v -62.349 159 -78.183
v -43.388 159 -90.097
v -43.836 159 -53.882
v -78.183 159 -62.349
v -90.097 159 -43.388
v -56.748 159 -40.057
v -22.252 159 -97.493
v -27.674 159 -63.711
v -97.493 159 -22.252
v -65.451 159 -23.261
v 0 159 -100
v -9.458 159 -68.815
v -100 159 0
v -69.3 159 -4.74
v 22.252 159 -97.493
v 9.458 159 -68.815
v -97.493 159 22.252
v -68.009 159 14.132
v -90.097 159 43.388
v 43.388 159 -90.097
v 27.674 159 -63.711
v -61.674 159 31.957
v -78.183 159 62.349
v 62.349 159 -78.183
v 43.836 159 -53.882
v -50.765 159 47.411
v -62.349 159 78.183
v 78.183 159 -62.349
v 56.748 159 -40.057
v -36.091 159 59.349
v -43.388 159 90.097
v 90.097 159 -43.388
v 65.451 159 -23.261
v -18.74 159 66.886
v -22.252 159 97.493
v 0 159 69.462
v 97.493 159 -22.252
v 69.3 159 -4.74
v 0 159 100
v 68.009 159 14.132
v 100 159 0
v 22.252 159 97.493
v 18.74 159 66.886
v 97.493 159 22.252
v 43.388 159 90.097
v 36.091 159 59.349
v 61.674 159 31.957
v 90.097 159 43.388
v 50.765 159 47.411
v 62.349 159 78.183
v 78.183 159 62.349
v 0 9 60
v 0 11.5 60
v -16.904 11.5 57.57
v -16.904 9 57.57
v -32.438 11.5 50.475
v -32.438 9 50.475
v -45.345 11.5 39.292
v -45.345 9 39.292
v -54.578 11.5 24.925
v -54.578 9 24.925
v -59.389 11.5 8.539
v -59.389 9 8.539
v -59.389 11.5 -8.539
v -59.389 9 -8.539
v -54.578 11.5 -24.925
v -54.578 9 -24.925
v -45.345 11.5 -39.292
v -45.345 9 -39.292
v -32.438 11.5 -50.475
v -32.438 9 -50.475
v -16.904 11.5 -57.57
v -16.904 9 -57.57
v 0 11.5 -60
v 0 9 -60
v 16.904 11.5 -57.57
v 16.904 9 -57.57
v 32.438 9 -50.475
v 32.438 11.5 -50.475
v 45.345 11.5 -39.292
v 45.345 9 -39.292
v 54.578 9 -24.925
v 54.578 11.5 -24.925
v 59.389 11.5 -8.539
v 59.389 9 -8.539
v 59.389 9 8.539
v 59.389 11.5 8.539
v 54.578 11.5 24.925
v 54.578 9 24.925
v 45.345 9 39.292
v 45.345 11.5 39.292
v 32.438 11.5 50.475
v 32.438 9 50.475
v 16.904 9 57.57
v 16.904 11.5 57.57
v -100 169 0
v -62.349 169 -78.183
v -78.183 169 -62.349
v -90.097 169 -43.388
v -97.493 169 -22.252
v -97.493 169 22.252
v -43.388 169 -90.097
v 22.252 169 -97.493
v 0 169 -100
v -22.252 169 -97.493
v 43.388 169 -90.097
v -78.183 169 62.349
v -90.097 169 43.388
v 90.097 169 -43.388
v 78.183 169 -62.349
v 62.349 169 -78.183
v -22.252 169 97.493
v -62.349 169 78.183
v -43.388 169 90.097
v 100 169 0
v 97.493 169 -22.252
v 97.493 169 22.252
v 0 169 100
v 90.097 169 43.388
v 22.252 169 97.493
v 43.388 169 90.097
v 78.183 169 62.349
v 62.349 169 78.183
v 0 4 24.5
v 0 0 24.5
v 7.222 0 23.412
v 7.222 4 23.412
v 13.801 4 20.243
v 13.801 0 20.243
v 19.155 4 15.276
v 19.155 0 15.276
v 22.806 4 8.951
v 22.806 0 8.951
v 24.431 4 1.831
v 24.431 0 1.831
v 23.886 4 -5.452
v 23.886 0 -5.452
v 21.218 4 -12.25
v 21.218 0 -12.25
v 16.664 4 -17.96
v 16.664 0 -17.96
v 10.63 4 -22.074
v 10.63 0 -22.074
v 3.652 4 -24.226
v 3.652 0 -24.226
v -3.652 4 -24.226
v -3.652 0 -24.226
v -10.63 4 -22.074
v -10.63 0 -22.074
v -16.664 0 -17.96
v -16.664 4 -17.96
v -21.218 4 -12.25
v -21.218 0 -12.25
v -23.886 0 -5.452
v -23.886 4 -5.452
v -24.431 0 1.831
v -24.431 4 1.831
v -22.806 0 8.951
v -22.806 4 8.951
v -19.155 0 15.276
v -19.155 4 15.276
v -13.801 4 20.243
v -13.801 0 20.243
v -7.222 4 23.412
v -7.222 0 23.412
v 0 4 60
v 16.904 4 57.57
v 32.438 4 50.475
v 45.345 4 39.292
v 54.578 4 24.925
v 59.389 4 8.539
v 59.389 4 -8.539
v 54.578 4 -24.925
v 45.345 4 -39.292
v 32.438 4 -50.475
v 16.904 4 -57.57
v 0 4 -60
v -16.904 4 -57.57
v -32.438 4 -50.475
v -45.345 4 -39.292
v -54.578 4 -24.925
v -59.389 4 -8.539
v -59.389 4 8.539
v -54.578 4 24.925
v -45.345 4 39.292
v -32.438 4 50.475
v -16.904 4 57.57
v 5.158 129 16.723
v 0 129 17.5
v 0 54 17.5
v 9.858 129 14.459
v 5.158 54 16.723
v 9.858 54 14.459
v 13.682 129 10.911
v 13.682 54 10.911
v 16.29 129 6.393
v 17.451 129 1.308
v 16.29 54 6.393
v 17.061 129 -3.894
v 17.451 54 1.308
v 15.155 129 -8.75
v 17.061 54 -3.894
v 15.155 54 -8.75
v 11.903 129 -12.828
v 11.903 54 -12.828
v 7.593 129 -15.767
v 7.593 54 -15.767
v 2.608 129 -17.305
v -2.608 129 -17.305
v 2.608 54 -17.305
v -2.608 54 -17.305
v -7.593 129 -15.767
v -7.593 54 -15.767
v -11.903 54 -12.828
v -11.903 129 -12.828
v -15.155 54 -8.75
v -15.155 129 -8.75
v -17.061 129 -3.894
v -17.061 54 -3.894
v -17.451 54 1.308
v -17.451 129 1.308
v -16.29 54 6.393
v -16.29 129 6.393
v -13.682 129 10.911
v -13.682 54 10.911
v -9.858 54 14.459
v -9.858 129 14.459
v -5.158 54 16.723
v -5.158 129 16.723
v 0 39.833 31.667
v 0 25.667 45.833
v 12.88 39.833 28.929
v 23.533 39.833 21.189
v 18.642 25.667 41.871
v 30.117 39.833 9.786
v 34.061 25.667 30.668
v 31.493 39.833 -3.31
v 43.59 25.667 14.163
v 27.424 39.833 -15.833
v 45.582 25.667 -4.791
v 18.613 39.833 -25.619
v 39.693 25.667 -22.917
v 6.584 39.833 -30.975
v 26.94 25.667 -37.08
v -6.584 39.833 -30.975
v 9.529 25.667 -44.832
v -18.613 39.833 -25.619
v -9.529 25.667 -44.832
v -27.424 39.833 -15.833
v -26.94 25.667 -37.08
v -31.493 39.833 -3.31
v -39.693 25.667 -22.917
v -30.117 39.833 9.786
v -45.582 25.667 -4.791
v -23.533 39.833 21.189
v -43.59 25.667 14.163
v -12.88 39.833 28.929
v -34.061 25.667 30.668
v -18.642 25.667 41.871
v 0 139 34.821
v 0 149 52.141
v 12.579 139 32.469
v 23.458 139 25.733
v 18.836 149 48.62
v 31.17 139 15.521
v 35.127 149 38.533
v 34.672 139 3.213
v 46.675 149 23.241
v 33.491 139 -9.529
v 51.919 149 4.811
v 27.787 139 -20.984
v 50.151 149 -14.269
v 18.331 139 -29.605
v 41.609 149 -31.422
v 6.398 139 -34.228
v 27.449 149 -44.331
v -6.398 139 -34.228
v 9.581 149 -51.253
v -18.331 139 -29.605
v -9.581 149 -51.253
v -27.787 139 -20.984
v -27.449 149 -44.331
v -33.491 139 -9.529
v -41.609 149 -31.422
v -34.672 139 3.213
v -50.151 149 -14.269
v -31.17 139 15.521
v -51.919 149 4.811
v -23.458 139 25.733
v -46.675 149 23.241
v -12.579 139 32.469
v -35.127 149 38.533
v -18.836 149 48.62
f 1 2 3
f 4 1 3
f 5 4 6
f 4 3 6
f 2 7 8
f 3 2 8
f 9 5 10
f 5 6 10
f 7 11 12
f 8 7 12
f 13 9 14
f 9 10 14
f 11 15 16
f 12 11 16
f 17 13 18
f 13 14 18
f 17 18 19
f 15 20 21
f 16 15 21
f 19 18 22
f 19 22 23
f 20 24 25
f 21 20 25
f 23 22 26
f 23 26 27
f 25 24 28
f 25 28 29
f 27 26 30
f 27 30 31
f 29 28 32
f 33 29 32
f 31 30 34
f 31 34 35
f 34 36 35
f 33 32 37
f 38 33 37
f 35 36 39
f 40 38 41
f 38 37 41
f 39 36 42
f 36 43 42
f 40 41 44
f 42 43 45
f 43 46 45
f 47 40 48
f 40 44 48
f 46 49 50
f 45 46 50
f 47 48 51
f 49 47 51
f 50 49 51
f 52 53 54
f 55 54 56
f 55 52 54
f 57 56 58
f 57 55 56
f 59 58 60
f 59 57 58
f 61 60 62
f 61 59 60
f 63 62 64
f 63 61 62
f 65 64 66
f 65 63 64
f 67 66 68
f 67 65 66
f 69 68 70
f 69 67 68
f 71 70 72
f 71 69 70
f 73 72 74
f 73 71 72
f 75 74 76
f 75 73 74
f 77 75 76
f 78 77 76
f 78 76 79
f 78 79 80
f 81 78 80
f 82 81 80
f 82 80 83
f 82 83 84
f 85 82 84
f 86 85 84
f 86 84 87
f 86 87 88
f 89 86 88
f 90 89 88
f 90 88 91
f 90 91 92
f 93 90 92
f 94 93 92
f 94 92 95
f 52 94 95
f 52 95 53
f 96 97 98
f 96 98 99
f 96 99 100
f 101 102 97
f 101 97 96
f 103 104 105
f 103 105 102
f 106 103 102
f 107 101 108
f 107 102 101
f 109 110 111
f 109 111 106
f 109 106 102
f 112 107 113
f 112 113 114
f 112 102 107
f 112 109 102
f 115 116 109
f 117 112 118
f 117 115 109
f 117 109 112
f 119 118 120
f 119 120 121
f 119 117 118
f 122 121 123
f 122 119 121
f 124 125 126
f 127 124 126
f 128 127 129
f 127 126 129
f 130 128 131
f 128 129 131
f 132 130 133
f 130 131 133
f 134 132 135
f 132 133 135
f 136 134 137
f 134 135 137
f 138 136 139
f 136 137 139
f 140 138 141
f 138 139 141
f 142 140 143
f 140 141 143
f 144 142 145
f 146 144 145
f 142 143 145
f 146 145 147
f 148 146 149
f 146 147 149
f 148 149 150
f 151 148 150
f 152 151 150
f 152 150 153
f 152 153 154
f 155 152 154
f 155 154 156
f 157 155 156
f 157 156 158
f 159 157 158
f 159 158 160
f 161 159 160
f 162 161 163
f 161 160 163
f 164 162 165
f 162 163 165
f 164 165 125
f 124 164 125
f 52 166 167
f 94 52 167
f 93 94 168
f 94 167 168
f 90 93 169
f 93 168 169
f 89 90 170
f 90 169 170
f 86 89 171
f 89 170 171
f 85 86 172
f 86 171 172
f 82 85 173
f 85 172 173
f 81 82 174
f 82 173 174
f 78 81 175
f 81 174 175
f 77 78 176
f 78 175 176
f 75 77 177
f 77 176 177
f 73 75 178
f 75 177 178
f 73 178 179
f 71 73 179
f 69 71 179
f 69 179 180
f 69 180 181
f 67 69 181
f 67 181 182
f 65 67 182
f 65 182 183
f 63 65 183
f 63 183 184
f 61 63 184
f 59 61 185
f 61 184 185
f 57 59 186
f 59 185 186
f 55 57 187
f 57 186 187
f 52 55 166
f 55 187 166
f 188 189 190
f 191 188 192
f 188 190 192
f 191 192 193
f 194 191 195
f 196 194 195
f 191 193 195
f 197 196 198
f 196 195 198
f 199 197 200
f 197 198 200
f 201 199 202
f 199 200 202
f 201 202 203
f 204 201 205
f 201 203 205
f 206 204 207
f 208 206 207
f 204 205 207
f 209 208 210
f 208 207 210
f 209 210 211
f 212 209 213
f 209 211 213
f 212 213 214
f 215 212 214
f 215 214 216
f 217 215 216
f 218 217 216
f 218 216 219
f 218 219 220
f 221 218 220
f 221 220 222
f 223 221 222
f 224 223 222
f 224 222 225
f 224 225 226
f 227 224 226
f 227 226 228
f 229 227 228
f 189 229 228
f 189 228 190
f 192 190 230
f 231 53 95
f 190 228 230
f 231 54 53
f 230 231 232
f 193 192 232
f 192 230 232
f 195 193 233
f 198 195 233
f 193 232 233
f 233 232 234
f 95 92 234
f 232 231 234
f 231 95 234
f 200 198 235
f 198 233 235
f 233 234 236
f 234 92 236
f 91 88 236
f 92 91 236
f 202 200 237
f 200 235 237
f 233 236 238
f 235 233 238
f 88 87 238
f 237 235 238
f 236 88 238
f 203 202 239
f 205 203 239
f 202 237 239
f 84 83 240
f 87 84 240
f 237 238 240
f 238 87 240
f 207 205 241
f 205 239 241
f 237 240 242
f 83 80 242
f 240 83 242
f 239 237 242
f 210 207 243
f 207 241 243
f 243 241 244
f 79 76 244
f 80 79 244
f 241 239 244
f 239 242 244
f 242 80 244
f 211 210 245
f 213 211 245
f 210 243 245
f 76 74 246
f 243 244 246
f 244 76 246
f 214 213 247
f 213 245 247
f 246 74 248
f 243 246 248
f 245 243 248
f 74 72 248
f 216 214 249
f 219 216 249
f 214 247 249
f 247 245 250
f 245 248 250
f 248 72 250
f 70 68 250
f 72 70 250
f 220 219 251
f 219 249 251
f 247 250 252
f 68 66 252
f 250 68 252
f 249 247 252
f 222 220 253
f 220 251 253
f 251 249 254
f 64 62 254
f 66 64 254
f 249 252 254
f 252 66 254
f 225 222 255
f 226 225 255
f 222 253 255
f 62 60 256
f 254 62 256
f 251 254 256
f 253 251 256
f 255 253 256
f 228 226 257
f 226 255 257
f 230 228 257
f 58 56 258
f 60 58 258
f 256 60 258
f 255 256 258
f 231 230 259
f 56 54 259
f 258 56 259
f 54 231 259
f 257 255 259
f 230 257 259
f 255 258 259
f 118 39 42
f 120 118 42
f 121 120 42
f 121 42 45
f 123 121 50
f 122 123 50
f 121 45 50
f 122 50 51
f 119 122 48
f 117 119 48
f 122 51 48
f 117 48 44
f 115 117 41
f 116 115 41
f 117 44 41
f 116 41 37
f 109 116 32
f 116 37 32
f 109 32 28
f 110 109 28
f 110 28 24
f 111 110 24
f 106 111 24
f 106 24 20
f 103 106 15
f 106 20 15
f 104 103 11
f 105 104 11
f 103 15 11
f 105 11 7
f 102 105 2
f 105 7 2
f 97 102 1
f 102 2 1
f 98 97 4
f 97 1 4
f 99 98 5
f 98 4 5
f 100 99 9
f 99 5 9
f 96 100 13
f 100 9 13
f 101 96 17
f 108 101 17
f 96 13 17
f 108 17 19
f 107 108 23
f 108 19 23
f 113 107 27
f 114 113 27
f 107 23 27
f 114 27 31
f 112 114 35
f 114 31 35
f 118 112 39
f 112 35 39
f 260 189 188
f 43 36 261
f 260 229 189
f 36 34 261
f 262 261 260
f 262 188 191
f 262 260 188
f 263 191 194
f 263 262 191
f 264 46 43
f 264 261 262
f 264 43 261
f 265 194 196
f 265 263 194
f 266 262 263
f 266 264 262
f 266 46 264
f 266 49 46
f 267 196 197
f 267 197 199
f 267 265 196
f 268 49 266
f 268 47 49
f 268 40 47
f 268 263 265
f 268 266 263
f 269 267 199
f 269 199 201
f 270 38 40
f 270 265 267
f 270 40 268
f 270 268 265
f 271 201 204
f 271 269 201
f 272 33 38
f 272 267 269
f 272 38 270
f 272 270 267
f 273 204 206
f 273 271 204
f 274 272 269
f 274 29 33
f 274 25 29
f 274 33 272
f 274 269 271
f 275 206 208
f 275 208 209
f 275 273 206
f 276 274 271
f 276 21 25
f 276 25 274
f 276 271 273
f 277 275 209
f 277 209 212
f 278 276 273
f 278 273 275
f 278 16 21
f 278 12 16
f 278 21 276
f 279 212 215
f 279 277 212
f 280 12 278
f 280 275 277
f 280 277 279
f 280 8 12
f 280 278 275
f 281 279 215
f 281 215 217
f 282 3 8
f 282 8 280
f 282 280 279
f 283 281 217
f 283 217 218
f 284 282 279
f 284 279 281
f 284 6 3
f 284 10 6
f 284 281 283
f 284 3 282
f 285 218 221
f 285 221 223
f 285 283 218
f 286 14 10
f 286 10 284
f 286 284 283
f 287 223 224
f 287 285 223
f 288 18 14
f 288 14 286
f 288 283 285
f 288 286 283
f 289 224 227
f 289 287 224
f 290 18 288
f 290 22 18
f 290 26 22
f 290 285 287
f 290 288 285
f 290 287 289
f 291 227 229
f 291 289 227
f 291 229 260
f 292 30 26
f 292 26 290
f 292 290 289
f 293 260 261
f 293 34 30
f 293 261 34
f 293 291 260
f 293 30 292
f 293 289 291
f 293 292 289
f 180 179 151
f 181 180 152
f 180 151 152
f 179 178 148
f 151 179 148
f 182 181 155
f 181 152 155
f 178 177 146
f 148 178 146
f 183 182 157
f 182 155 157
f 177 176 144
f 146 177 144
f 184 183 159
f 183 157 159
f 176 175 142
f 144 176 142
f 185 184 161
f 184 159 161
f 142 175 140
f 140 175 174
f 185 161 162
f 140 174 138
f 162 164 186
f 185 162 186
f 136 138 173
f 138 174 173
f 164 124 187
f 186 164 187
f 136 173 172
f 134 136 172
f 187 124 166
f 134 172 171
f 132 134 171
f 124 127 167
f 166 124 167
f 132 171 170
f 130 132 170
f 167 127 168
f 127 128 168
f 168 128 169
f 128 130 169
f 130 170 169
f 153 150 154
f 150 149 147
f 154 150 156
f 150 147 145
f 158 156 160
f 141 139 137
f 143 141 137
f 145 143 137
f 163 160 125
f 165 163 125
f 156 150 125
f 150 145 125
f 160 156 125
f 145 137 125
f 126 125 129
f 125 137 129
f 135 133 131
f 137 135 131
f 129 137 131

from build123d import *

# Parameters (mm, degrees)
SKETCH_1_R      = 24.5
EXTRUDE_1_DEPTH = 4
SKETCH_Q_R      = 60
EXTRUDE_2_DEPTH = 5
SKETCH_3_R      = 17.5
EXTRUDE_3_DEPTH = 150
SKETCH_4_R      = 100
EXTRUDE_4_DEPTH = 10
CHAMFER_1_SIZE  = 45
CHAMFER_2_SIZE  = 30
CHAMFER_2_SIZE2 = 51.961524227


with BuildPart() as part:
    # 草图1 → 凸台-拉伸1 (new body)
    with BuildSketch(Plane(origin=(0, 0, 0), x_dir=(1, 0, 0), z_dir=(0, 1, 0))):
        with Locations(Location((0, 0, 0), (0, 0, 270))):
            Circle(SKETCH_1_R)
    extrude(amount=EXTRUDE_1_DEPTH)

    # q → 凸台-拉伸2 (add)
    with BuildSketch(Plane(origin=(0, 4, 0), x_dir=(1, 0, 0), z_dir=(0, 1, 0))):
        with Locations(Location((0, 0, 0), (0, 0, 270))):
            Circle(SKETCH_Q_R)
    extrude(amount=EXTRUDE_2_DEPTH)

    # 草图3 → 凸台-拉伸3 (add)
    with BuildSketch(Plane(origin=(0, 9, 0), x_dir=(1, 0, 0), z_dir=(0, 1, 0))):
        with Locations(Location((0, 0, 0), (0, 0, 270))):
            Circle(SKETCH_3_R)
    extrude(amount=EXTRUDE_3_DEPTH)

    # 草图4 → 凸台-拉伸4 (add)
    with BuildSketch(Plane(origin=(0, 159, 0), x_dir=(1, 0, 0), z_dir=(0, 1, 0))):
        with Locations(Location((0, 0, 0), (0, 0, 270))):
            Circle(SKETCH_4_R)
    extrude(amount=EXTRUDE_4_DEPTH)

    # 倒角1
    # the kernel refuses this chamfer: 45 mm, written as the material it adds along each edge
    with BuildSketch(Plane(origin=(0, 9, 0), x_dir=(0, 0, 1), z_dir=(-1, 0, 0))) as chamfer_1_piece_1_section:
        Polygon((17.5, CHAMFER_1_SIZE), (17.5 + CHAMFER_1_SIZE, 0), (17.5, 0), align=None)
    chamfer_1_piece_1 = revolve(axis=Axis((0, 9, 0), (0, 1, 0)), mode=Mode.PRIVATE)
    chamfer_1_piece_1 = chamfer_1_piece_1 & Plane(origin=(0, 32.95787502, 0), x_dir=(0, 0, 1), z_dir=(0, -1, 0)) * Cylinder(60, 250, mode=Mode.PRIVATE)
    add(chamfer_1_piece_1)

    # 倒角2
    chamfer_2_edges = [part.edges().sort_by_distance(p)[0] for p in [
        (0, 159, -17.5),
    ]]
    chamfer_2_side = [part.faces().sort_by_distance(p)[0] for p in [
        (0, 106.5, -17.5),
    ]]
    chamfer(chamfer_2_edges, length=CHAMFER_2_SIZE, length2=CHAMFER_2_SIZE2, reference=chamfer_2_side[0])


solid = part.part
